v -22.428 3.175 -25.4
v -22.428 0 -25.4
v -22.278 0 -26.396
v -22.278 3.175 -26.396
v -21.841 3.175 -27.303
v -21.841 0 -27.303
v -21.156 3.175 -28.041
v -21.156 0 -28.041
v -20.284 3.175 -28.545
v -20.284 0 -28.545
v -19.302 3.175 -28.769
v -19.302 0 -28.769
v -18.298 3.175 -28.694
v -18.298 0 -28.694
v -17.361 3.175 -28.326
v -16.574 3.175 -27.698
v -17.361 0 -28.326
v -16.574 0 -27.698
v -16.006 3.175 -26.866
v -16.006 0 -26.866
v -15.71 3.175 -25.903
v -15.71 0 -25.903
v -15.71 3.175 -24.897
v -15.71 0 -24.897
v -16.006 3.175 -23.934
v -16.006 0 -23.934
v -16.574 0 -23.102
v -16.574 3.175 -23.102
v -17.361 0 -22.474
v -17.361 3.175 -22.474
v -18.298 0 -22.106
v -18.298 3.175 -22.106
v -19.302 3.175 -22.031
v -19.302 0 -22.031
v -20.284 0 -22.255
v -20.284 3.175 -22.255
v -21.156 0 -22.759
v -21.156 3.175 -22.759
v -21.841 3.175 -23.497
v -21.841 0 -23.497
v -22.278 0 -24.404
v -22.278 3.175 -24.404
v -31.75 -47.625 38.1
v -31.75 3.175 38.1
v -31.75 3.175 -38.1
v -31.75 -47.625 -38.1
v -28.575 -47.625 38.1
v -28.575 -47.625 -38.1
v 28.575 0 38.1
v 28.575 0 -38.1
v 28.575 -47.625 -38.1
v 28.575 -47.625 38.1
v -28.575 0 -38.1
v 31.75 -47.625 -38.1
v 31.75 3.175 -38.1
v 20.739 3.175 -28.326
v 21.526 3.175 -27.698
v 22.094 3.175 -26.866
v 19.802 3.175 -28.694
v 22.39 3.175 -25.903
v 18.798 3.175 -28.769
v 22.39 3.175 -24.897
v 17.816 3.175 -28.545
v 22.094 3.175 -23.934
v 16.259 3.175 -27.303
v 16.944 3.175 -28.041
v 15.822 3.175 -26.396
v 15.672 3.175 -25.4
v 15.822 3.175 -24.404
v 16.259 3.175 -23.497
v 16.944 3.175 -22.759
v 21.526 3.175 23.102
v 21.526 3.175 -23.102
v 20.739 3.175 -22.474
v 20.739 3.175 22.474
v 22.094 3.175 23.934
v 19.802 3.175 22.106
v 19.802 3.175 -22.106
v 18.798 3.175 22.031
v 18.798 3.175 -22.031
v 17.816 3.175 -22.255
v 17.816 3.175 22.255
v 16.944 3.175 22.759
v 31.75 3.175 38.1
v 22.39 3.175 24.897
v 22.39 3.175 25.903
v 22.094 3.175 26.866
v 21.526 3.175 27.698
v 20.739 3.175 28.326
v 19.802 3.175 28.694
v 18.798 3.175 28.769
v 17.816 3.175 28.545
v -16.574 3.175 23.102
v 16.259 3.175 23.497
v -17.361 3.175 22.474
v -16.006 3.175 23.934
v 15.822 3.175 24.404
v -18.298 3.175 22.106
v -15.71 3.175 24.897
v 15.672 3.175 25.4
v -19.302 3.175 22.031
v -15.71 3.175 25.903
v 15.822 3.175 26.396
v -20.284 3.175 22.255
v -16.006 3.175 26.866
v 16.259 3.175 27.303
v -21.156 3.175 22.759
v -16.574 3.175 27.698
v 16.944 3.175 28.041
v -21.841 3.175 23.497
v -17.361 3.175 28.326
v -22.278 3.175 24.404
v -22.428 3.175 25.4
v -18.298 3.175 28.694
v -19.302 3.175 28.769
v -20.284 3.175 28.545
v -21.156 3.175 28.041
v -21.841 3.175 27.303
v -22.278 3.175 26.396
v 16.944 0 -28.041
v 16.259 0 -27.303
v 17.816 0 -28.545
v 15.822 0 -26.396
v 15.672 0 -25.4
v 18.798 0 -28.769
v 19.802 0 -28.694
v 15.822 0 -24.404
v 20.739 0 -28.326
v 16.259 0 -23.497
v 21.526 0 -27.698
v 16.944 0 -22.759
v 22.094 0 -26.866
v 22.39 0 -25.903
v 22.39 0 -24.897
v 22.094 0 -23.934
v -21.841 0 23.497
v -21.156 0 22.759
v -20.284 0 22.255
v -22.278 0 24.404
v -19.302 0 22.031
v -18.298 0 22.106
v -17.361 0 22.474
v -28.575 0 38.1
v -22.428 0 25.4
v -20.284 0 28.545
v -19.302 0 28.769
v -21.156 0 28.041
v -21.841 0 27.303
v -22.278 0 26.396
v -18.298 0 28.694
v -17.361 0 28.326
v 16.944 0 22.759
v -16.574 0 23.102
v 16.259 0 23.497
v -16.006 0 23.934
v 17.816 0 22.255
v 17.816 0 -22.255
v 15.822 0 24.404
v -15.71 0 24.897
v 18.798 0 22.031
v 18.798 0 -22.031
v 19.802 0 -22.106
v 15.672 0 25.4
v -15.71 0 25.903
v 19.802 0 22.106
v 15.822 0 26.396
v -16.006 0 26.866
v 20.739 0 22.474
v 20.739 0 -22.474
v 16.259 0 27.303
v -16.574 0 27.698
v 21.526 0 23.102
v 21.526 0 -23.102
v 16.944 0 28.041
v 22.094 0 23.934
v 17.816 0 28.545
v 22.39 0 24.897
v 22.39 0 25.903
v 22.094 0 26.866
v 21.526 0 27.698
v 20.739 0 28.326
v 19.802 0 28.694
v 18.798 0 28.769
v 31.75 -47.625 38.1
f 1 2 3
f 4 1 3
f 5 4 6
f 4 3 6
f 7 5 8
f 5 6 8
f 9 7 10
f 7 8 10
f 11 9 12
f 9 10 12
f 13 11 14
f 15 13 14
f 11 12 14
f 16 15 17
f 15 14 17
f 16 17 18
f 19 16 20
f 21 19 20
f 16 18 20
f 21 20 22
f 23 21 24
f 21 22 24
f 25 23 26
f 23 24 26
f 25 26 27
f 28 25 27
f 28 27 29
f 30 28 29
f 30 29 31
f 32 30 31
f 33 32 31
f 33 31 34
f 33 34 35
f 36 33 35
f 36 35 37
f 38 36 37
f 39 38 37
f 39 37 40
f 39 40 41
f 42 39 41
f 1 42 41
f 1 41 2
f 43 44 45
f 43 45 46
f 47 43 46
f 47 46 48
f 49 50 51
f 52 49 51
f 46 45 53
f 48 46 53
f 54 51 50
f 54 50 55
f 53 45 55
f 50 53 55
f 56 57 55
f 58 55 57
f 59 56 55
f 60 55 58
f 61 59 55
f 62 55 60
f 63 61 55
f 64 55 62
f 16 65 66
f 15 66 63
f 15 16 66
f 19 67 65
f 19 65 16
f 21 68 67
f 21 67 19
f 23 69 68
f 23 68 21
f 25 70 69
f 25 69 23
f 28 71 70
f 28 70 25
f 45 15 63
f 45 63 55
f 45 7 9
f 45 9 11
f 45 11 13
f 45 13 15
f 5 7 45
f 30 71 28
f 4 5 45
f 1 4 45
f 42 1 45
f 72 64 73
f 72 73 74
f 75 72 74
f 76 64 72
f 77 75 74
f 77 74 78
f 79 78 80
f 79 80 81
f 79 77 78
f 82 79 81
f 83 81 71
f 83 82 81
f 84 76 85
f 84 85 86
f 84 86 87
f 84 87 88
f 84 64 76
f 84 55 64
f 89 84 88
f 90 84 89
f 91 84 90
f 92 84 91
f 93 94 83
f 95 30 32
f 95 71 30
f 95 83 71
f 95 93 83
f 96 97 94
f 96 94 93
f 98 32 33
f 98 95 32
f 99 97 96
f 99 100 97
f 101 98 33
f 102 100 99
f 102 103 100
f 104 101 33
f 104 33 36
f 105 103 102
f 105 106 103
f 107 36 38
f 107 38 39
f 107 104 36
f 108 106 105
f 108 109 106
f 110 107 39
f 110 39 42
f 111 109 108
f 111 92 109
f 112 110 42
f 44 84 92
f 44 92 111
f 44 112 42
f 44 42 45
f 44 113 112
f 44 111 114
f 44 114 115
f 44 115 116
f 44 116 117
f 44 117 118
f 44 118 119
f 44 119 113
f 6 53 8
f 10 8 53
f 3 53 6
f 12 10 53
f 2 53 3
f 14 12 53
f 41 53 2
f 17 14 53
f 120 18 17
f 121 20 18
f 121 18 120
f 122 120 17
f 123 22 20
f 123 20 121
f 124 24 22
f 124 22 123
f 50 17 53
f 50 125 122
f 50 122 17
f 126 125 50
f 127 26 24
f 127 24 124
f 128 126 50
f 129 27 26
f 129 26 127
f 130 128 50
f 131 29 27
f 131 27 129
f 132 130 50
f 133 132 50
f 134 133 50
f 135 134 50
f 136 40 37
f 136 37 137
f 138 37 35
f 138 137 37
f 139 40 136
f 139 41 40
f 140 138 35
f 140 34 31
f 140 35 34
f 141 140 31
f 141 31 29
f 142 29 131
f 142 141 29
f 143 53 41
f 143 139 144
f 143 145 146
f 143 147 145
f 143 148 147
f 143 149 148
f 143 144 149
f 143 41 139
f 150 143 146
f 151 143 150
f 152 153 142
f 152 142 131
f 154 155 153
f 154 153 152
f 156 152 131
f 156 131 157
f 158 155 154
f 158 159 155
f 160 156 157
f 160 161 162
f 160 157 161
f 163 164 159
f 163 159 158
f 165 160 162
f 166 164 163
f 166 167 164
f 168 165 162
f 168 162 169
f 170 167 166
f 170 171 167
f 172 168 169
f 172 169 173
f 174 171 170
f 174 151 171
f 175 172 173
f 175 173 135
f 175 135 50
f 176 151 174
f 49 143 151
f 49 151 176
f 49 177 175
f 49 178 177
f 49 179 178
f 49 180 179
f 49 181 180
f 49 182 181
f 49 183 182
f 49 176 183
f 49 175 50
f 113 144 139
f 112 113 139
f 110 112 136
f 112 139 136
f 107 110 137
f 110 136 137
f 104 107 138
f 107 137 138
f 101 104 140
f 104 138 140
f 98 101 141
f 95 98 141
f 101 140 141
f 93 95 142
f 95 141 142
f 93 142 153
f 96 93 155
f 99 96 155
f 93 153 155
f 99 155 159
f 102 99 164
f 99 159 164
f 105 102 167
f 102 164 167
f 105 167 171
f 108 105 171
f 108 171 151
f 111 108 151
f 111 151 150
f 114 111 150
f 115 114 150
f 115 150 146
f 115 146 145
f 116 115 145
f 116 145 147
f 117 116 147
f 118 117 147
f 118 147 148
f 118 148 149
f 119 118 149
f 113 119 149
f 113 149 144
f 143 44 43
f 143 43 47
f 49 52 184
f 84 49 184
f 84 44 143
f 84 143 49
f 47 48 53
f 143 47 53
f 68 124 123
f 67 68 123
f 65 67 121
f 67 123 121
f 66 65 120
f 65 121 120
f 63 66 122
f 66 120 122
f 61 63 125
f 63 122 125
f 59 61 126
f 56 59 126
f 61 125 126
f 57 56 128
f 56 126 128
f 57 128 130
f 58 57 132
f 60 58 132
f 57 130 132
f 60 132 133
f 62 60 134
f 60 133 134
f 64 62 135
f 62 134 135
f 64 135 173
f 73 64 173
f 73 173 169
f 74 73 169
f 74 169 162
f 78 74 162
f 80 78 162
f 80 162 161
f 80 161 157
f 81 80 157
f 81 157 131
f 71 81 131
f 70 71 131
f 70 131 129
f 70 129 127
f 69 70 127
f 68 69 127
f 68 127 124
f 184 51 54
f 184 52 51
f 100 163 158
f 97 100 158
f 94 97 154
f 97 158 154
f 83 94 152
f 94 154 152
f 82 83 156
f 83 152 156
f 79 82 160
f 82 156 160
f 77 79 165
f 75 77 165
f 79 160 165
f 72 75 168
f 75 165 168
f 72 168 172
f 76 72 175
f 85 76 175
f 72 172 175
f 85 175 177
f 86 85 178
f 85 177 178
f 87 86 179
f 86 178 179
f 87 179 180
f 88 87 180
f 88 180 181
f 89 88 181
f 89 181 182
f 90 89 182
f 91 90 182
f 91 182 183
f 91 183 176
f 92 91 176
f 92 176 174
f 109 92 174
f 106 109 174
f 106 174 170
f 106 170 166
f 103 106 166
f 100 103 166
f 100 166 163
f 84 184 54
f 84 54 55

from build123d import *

# Parameters (mm, degrees)
BOSS_EXTRUDE1_DEPTH     = 38.1
F_1_4_CLEARANCE_HOLE1_D = 6.7564


with BuildPart() as part:
    # Sketch1 → Boss-Extrude1 (new body, symmetric)
    with BuildSketch(Plane.XY):
        Polygon((28.575, -47.625), (31.75, -47.625), (31.75, 3.175), (-31.75, 3.175), (-31.75, -47.625), (-28.575, -47.625), (-28.575, 0), (28.575, 0), align=None)
    extrude(amount=BOSS_EXTRUDE1_DEPTH, both=True)

    # 1/4 Clearance Hole1 (through all)
    with Locations(Plane(origin=(0, 3.175, 0), x_dir=(1, 0, 0), z_dir=(0, 1, 0))):
        with Locations((-19.05, 25.4), (19.05, 25.4), (19.05, -25.4), (-19.05, -25.4)):
            Hole(F_1_4_CLEARANCE_HOLE1_D / 2)


solid = part.part
